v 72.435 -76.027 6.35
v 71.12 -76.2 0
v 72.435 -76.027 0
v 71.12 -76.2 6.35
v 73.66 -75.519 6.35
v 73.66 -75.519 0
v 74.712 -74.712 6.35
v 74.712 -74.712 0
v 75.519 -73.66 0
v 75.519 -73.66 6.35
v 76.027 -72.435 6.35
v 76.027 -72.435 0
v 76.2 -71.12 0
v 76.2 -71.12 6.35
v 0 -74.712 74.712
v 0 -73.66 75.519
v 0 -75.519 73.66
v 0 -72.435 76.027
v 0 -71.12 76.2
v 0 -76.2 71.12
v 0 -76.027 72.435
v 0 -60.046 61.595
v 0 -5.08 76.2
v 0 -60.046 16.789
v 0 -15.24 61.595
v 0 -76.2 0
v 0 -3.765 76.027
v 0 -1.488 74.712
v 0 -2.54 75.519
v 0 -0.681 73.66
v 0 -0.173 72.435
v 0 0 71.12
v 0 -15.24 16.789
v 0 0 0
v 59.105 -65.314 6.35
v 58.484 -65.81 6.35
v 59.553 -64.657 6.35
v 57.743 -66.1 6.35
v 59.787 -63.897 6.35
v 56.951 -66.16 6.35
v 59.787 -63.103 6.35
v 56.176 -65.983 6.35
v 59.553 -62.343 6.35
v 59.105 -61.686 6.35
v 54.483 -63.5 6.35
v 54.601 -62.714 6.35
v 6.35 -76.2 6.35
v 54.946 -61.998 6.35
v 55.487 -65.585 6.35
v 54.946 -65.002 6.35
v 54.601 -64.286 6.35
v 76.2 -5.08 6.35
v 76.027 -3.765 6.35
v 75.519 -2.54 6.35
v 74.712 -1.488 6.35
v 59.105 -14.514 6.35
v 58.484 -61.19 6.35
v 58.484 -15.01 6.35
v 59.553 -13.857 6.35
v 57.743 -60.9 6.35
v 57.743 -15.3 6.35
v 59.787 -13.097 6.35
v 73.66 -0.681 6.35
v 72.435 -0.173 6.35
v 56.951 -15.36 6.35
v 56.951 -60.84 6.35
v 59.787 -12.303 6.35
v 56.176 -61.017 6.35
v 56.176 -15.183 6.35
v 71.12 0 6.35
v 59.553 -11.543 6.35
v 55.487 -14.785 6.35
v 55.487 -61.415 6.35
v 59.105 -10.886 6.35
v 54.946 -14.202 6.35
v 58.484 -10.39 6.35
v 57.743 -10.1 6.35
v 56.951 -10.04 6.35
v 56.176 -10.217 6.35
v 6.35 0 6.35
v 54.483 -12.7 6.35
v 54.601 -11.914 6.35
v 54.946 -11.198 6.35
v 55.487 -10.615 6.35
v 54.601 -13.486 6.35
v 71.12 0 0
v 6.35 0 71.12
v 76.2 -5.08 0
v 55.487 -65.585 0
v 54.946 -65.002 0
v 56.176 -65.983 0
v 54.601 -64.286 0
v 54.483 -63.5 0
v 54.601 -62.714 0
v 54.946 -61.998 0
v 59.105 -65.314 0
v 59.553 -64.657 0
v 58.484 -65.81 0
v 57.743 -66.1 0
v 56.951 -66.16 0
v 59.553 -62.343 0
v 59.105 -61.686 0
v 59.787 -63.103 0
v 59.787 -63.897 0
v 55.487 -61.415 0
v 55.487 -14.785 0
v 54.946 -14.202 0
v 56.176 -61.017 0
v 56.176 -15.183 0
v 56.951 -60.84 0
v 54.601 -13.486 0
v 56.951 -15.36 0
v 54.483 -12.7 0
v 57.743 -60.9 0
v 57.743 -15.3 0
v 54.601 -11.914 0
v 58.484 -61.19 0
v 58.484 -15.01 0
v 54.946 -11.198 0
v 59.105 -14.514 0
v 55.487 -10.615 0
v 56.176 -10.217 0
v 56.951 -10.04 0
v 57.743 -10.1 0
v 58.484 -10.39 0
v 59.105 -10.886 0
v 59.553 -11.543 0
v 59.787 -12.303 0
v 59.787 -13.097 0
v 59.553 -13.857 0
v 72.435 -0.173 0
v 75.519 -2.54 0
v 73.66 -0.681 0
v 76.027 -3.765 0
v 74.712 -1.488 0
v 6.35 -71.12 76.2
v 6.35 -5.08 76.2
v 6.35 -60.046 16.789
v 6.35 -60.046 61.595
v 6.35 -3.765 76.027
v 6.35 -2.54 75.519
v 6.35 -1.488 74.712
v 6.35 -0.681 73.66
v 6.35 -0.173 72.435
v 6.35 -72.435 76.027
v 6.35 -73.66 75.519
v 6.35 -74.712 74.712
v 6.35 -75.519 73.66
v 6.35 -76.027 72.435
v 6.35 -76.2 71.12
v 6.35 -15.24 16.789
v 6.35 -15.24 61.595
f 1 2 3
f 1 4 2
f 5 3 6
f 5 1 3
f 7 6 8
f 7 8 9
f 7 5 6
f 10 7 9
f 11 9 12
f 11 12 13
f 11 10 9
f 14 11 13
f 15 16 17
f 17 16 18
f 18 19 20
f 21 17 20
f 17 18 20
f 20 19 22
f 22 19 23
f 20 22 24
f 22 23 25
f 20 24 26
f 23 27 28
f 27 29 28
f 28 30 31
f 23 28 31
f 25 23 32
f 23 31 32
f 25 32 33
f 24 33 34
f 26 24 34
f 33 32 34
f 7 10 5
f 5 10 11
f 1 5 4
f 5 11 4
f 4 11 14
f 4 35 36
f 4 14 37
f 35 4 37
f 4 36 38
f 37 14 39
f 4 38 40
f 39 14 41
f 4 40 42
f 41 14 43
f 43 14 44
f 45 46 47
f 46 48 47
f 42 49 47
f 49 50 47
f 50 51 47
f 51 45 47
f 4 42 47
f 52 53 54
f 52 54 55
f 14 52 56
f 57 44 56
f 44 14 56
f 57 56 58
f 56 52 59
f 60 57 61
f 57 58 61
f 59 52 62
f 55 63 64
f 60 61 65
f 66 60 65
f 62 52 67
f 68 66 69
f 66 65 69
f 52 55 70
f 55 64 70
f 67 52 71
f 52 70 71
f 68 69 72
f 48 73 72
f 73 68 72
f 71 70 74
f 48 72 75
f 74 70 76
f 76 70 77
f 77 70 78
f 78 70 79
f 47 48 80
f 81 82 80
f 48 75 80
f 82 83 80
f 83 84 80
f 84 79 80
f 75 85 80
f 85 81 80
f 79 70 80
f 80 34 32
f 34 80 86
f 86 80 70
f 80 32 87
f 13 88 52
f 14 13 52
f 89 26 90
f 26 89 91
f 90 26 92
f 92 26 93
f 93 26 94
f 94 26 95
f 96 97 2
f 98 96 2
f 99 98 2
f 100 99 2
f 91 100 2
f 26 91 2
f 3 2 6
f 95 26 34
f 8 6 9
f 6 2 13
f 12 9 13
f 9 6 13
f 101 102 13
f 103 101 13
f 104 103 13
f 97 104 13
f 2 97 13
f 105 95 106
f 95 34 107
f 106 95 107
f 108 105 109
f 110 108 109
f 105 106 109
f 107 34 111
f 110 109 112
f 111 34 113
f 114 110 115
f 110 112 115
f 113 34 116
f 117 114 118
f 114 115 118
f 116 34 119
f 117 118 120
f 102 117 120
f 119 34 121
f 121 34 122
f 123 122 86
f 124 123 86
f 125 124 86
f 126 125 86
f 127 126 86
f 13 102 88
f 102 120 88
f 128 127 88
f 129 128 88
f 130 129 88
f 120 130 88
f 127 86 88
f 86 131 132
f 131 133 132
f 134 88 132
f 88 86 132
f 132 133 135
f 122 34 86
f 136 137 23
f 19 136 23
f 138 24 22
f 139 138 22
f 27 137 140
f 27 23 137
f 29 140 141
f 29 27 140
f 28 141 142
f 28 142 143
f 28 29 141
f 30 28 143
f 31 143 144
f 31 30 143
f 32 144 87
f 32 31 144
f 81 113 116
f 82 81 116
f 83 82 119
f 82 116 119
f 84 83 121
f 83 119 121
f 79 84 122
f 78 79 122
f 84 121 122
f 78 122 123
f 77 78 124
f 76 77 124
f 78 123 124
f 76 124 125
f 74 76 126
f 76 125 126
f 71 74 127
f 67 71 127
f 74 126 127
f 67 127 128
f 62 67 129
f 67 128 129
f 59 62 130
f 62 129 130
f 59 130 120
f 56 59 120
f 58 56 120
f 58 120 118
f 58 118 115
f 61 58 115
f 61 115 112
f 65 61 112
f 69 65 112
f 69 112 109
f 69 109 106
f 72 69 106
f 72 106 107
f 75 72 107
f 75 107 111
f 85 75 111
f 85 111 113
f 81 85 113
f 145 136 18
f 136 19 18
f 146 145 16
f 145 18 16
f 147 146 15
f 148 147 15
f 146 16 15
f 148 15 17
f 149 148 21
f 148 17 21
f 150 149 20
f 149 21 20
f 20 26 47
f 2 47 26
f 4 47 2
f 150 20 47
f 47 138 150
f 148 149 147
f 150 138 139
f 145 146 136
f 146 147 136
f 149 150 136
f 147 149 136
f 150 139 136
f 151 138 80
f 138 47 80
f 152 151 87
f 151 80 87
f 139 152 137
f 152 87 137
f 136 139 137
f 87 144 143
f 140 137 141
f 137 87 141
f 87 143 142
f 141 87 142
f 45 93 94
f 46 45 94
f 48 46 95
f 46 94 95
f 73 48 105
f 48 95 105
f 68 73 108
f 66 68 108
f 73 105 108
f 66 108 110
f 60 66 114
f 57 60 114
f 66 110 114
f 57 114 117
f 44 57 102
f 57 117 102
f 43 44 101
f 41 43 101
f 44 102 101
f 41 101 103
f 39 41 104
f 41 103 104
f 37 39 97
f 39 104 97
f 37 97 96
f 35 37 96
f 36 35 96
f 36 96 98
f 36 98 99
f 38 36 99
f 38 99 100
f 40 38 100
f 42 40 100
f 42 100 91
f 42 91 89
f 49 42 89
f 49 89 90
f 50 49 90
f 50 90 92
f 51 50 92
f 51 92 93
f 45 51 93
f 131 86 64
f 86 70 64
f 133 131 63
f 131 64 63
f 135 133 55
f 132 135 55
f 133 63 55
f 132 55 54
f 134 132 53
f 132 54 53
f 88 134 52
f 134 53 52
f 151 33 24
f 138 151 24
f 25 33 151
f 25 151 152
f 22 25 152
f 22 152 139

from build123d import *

# Parameters (mm, degrees)
F1_DEPTH = 76.2
F2_W     = 44.8056
F2_H     = 44.8056
F3_DEPTH = 25.4
F5_D     = 5.334
F5_DEPTH = 12.7
F6_R     = 5.08


with BuildPart() as f1:
    # F0 (on Front) → F1 (new body)
    with BuildSketch(Plane.XZ):
        Polygon((0, 76.2), (0, 0), (76.2, 0), (76.2, 6.35), (6.35, 6.35), (6.35, 76.2), align=None)
    extrude(amount=F1_DEPTH)

    # F2 (on face) → F3 (cut)
    with BuildSketch(Plane(origin=(0, 0, 0), x_dir=(0, -1, 0), z_dir=(-1, 0, 0))):
        with Locations((37.6428, 39.1922)):
            Rectangle(F2_W, F2_H)
    extrude(amount=-F3_DEPTH, mode=Mode.SUBTRACT)

    # F5
    with Locations(Plane.XY.offset(6.35)):
        with Locations((57.15, -12.7), (57.15, -63.5)):
            Hole(F5_D / 2, depth=F5_DEPTH)

    # F6
    f6_edges = [f1.edges().sort_by_distance(p)[0] for p in [
        (3.175, 0, 76.2),
        (3.175, -76.2, 76.2),
        (76.2, -76.2, 3.175),
        (76.2, 0, 3.175),
    ]]
    fillet(f6_edges, radius=F6_R)


solid = f1.part
